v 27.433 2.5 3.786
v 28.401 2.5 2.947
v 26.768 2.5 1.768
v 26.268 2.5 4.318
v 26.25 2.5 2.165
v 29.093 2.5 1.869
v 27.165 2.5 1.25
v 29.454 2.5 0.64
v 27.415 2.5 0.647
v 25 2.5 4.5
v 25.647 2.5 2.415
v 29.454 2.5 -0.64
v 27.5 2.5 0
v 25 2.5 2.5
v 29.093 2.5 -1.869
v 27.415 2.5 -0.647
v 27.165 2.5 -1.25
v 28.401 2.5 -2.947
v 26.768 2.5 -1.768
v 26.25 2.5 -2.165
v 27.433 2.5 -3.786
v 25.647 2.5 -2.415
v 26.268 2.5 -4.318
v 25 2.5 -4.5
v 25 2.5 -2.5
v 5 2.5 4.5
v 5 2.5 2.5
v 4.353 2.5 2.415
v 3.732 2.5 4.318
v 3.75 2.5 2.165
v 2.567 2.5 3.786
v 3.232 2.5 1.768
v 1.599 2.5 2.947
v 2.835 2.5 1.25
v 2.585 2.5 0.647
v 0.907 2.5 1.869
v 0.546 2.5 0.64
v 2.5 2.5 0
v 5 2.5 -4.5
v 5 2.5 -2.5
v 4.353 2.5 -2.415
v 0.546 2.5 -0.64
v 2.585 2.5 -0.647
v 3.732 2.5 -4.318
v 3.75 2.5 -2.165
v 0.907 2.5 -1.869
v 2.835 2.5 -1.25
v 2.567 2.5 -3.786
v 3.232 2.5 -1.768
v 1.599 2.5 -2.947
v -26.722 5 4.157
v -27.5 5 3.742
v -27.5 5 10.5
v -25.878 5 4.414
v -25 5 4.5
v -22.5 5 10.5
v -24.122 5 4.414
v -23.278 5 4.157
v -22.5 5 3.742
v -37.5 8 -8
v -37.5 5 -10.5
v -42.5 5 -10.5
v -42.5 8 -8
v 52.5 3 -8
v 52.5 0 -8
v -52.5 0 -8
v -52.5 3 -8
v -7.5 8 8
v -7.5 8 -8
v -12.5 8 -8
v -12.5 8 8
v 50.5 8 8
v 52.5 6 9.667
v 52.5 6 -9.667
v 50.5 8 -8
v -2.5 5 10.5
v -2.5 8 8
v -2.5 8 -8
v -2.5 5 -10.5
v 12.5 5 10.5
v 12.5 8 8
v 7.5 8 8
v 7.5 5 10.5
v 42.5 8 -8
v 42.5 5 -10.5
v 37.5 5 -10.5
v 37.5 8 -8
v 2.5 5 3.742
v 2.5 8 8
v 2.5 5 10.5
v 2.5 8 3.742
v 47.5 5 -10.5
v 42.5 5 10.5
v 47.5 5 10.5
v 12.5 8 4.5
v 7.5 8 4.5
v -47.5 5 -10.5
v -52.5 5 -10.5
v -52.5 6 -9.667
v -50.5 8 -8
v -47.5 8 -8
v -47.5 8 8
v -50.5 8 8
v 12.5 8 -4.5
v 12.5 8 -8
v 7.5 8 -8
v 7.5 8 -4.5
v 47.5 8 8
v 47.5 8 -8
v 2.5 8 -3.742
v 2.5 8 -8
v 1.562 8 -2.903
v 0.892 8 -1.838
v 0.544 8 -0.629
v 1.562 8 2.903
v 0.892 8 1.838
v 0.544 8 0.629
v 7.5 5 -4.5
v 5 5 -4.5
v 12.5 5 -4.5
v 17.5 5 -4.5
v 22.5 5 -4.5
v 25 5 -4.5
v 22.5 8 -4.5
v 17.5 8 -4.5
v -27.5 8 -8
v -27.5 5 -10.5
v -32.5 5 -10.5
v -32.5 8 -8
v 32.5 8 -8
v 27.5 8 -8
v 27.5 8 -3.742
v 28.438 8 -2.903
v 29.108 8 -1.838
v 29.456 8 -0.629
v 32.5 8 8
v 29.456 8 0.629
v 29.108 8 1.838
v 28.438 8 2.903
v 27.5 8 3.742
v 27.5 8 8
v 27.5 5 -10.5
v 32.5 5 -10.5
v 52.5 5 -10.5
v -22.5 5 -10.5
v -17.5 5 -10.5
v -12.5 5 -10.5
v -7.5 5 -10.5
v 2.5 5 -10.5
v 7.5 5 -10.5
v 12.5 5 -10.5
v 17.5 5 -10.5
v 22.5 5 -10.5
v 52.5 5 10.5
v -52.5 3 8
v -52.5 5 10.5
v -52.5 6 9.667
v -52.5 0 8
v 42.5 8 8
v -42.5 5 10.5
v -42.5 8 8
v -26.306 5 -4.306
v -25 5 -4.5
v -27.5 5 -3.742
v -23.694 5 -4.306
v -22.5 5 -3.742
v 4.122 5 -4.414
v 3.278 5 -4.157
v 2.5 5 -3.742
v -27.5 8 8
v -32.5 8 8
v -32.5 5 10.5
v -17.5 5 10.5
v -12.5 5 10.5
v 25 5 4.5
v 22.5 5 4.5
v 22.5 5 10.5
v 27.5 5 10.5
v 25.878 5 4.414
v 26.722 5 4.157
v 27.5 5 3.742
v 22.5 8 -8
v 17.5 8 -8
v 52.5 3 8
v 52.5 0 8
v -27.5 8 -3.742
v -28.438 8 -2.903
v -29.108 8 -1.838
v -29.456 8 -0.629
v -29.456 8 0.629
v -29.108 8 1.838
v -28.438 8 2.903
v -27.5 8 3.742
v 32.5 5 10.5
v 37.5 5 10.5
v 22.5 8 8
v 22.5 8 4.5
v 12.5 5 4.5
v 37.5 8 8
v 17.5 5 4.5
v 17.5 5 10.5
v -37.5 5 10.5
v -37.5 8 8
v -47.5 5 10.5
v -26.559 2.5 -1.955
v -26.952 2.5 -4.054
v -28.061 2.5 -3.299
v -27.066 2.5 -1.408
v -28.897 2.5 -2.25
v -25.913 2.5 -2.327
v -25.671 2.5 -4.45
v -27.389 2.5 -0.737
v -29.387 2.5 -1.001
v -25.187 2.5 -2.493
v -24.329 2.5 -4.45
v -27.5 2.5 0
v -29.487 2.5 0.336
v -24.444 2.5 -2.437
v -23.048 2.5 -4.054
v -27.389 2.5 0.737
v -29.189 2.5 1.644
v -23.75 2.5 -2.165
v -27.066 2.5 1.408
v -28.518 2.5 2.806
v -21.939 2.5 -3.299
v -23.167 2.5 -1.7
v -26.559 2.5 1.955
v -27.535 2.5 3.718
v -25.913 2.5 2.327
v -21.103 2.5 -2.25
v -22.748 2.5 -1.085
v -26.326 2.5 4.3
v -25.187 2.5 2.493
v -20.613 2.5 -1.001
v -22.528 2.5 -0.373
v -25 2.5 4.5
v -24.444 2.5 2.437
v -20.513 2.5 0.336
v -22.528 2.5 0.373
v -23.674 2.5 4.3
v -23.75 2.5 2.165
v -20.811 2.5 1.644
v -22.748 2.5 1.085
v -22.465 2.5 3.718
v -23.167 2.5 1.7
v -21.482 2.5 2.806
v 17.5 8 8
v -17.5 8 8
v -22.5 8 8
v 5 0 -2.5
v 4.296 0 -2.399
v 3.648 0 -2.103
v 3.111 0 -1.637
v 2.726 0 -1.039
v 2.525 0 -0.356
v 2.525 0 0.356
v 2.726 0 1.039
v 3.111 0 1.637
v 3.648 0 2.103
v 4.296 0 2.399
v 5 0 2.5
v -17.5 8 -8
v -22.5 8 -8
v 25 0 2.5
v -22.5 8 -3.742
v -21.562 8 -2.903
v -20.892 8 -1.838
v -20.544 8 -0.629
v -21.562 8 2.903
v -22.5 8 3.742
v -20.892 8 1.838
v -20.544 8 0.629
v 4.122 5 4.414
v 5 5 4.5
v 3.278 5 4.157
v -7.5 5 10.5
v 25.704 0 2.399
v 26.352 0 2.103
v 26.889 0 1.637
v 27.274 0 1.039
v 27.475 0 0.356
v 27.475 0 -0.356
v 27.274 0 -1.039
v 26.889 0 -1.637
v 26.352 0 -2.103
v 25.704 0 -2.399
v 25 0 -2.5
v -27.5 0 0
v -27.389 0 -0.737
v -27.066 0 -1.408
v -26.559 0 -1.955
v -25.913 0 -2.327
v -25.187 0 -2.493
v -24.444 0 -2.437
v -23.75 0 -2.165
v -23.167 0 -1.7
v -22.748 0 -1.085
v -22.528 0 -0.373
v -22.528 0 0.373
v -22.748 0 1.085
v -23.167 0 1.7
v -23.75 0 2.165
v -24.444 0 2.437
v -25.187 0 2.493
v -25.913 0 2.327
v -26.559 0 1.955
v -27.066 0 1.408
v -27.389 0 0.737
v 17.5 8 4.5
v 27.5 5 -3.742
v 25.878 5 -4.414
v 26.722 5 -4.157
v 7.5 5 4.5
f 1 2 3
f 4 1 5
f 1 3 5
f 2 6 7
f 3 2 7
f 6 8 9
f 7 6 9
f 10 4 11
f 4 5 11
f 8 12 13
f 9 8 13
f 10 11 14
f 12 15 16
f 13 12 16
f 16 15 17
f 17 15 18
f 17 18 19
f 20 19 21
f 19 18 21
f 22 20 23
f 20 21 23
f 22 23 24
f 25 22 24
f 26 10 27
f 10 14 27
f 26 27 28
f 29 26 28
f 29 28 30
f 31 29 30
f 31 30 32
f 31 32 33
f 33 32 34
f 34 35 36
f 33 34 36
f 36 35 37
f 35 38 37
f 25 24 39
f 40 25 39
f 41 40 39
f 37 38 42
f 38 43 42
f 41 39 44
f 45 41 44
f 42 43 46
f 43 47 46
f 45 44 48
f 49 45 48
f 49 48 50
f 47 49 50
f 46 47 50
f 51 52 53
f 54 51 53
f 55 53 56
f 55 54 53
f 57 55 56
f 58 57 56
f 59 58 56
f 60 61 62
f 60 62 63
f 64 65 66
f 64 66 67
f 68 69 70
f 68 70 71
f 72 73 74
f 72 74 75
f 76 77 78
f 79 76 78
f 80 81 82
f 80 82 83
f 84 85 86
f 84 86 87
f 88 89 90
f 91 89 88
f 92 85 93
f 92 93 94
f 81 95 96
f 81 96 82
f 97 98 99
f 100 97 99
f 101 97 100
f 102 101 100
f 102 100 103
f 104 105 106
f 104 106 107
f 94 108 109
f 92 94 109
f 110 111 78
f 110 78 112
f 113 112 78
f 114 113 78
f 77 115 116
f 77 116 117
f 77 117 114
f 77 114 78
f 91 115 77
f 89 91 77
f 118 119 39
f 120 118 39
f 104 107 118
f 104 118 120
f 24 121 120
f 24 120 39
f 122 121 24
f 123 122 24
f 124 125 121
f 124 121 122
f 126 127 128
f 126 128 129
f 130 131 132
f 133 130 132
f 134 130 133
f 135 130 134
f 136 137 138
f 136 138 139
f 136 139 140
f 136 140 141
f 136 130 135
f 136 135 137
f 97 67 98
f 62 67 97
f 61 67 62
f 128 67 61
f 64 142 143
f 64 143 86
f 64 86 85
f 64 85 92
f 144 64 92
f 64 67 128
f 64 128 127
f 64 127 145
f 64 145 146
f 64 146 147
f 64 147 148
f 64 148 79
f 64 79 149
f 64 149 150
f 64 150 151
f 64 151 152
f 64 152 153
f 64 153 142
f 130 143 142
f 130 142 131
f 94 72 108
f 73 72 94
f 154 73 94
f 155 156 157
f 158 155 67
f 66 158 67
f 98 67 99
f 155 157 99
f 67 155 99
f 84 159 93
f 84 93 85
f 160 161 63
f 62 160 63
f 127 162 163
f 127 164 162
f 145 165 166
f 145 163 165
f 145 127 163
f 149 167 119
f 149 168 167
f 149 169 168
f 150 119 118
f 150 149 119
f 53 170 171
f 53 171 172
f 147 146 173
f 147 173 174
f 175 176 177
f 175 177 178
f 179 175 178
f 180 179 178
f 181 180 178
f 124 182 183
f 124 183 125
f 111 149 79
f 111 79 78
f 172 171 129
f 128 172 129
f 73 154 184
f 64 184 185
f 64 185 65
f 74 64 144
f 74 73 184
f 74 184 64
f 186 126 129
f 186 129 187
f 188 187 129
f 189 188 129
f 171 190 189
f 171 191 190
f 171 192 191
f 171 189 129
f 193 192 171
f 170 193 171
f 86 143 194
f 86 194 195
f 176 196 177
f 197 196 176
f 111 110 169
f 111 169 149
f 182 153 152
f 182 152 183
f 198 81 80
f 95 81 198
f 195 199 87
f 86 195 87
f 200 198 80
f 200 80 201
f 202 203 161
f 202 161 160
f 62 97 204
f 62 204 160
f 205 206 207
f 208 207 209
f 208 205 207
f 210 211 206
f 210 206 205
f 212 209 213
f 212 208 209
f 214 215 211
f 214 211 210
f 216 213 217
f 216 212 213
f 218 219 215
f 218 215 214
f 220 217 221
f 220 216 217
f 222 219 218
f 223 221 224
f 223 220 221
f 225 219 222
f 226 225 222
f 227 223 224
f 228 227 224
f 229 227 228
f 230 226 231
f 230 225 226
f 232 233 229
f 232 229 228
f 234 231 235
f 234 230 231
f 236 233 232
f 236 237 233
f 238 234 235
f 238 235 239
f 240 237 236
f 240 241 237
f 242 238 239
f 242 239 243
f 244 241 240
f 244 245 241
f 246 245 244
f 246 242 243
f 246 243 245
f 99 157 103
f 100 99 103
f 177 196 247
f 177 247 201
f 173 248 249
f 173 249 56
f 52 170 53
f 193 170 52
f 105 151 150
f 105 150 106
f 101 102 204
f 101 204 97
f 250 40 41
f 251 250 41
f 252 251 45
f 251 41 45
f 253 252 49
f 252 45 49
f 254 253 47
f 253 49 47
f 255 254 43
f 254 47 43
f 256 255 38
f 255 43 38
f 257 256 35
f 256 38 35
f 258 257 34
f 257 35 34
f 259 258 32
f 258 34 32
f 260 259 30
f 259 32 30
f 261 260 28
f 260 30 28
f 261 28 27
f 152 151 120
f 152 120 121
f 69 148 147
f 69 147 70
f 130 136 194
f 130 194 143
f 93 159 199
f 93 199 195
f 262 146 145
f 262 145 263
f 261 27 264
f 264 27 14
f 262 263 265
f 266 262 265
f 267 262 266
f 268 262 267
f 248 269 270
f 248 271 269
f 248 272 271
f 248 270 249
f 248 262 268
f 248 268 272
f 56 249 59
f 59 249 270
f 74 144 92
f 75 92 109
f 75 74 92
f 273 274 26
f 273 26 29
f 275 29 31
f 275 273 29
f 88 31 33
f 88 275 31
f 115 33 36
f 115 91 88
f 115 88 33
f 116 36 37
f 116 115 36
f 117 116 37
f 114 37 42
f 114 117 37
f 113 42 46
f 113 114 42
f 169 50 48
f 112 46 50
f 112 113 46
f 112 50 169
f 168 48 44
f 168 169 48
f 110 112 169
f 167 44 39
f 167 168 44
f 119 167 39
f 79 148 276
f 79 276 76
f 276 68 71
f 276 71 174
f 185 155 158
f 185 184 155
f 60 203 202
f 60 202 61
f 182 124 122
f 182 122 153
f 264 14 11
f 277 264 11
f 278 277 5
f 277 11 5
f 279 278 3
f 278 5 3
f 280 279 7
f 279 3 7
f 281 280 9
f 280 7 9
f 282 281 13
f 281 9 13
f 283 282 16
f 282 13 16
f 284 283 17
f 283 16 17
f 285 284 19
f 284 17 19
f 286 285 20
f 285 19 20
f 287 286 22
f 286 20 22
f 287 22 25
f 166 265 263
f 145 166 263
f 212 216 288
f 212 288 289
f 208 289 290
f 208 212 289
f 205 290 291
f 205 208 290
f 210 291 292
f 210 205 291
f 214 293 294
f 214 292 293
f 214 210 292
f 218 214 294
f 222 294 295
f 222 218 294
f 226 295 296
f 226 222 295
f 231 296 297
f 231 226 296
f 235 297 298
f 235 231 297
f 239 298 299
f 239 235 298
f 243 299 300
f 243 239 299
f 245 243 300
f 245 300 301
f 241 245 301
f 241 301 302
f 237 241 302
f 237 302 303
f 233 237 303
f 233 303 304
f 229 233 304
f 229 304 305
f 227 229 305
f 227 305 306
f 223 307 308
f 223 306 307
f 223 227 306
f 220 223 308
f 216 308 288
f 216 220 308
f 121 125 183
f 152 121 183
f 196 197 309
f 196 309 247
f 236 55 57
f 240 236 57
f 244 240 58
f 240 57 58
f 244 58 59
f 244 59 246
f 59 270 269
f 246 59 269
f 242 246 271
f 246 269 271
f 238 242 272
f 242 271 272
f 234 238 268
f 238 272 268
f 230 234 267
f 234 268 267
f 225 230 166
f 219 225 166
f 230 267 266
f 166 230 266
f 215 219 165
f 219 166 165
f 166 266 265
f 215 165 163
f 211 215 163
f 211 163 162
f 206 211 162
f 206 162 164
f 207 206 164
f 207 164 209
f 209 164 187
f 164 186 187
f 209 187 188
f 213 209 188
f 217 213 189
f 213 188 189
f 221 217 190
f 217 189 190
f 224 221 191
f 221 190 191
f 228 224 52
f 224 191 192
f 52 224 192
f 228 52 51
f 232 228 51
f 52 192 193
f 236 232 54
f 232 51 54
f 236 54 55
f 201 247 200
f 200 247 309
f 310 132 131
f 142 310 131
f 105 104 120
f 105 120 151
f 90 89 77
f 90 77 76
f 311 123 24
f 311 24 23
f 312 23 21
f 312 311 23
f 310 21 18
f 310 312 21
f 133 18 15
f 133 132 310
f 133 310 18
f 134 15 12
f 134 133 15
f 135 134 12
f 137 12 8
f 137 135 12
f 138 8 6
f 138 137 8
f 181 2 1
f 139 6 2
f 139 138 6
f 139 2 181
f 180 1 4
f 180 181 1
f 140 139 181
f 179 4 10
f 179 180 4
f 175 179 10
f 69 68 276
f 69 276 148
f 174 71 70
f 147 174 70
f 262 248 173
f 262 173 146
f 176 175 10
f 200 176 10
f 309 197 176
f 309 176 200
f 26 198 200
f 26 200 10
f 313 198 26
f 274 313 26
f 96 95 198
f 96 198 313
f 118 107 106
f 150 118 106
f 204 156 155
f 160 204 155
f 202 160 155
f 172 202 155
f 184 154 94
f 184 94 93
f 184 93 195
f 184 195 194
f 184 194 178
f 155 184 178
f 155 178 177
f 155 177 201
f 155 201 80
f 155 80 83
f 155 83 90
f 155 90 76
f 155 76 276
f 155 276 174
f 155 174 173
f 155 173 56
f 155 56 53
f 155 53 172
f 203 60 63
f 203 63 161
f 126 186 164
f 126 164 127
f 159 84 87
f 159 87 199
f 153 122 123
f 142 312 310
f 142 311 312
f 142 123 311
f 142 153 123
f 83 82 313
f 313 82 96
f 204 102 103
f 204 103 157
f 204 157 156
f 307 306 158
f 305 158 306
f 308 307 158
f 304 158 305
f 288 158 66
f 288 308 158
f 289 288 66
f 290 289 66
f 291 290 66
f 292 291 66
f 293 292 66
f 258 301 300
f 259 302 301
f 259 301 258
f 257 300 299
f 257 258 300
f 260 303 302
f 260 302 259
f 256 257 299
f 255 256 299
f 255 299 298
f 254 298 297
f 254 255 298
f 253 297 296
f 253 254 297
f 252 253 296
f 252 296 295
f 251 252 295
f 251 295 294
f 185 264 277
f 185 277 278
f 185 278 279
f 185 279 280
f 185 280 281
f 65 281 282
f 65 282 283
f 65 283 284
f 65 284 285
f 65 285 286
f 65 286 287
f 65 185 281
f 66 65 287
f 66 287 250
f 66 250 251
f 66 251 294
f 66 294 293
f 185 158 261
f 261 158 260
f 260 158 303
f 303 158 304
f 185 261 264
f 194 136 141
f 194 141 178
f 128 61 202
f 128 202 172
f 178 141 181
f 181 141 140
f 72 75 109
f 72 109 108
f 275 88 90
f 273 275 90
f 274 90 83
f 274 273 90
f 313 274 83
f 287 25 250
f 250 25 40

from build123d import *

# Parameters (mm, degrees)
EXTRUDE_1_DEPTH          = 52.5
SKETCH_2_W               = 5
SKETCH_2_H               = 21
CUT_EXTRUDE_1_DEPTH      = 3
CUT_EXTRUDE_2_DEPTH      = 55.13409277
CUT_EXTRUDE_2_DEPTH_BACK = 55.13409277
SKETCH_3_R               = 2.5
CUT_EXTRUDE_3_DEPTH      = 55.13409277
SKETCH_5_R               = 4.5
CUT_EXTRUDE_4_DEPTH      = 5.5


with BuildPart() as part:
    # 草图1 → 凸台-拉伸1 (new, symmetric)
    with BuildSketch(Plane(origin=(0, 0, 0), x_dir=(0, 0, -1), z_dir=(1, 0, 0))):
        Polygon((-8, 0), (8, 0), (8, 3), (10.5, 5), (8, 8), (-8, 8), (-10.5, 5), (-8, 3), align=None)
    extrude(amount=EXTRUDE_1_DEPTH, both=True)

    # 草图2 → 切除-拉伸1 (cut)
    with BuildSketch(Plane(origin=(0, 8, 0), x_dir=(1, 0, 0), z_dir=(0, 1, 0))):
        with Locations((-5, 0)):
            Rectangle(SKETCH_2_W, SKETCH_2_H)
        with Locations((45, 0)):
            Rectangle(SKETCH_2_W, SKETCH_2_H)
        with Locations((-15, 0)):
            Rectangle(SKETCH_2_W, SKETCH_2_H)
        with Locations((-25, 0)):
            Rectangle(SKETCH_2_W, SKETCH_2_H)
        with Locations((-35, 0)):
            Rectangle(SKETCH_2_W, SKETCH_2_H)
        with Locations((-45, 0)):
            Rectangle(SKETCH_2_W, SKETCH_2_H)
        with Locations((35, 0)):
            Rectangle(SKETCH_2_W, SKETCH_2_H)
        with Locations((25, 0)):
            Rectangle(SKETCH_2_W, SKETCH_2_H)
        with Locations((15, 0)):
            Rectangle(SKETCH_2_W, SKETCH_2_H)
        with Locations((5, 0)):
            Rectangle(SKETCH_2_W, SKETCH_2_H)
    extrude(amount=-CUT_EXTRUDE_1_DEPTH, mode=Mode.SUBTRACT)

    # 草图3 → 切除-拉伸2 (cut, two sides: drawn at the far end of the back side and taken through both)
    with BuildSketch(Plane.XZ.offset(-CUT_EXTRUDE_2_DEPTH_BACK)):
        with Locations(Location((-25, 0, 0), (0, 0, 180))):
            Circle(SKETCH_3_R)
        with BuildLine():
            Line((5, 2.5), (25, 2.5))
            ThreePointArc((25, 2.5), (27.5, 0), (25, -2.5))
            Line((25, -2.5), (5, -2.5))
            ThreePointArc((5, -2.5), (2.5, 0), (5, 2.5))
        make_face()
    extrude(amount=CUT_EXTRUDE_2_DEPTH + CUT_EXTRUDE_2_DEPTH_BACK, mode=Mode.SUBTRACT)

    # 草图4 → 切除-拉伸3 (cut, symmetric)
    with BuildSketch(Plane.XY):
        Polygon((-52.5, 6), (-50.5, 8), (-52.5, 8), align=None)
    cut_extrude_3 = extrude(amount=CUT_EXTRUDE_3_DEPTH, both=True, mode=Mode.SUBTRACT)

    # 镜向1: 切除-拉伸3 across plane
    add(cut_extrude_3.mirror(Plane(origin=(0, 0, 0), x_dir=(0, 0, 1), z_dir=(1, 0, 0))), mode=Mode.SUBTRACT)

    # 草图5 → 切除-拉伸4 (cut)
    # profile 1 of 2: a face of its own
    with BuildSketch(Plane(origin=(0, 8, 0), x_dir=(1, 0, 0), z_dir=(0, 1, 0))):
        with Locations(Location((-25, 0, 0), (0, 0, 270))):
            Circle(SKETCH_5_R)
    # profile 2 of 2: a face of its own
    with BuildSketch(Plane(origin=(0, 8, 0), x_dir=(1, 0, 0), z_dir=(0, 1, 0))):
        with BuildLine():
            Line((5, 4.5), (25, 4.5))
            ThreePointArc((25, 4.5), (29.5, 0), (25, -4.5))
            Line((25, -4.5), (5, -4.5))
            ThreePointArc((5, -4.5), (0.5, 0), (5, 4.5))
        make_face()
        with BuildLine():
            Line((7.5, -2.5), (5, -2.5))
            ThreePointArc((5, -2.5), (3.232233047, -1.767766953), (2.5, 0))
            ThreePointArc((2.5, 0), (3.232233047, 1.767766953), (5, 2.5))
            Line((5, 2.5), (7.5, 2.5))
            Line((7.5, 2.5), (12.5, 2.5))
            Line((12.5, 2.5), (17.5, 2.5))
            Line((17.5, 2.5), (22.5, 2.5))
            Line((22.5, 2.5), (25, 2.5))
            ThreePointArc((25, 2.5), (26.767766953, 1.767766953), (27.5, 0))
            ThreePointArc((27.5, 0), (26.767766953, -1.767766953), (25, -2.5))
            Line((25, -2.5), (22.5, -2.5))
            Line((22.5, -2.5), (17.5, -2.5))
            Line((17.5, -2.5), (12.5, -2.5))
            Line((12.5, -2.5), (7.5, -2.5))
        make_face(mode=Mode.SUBTRACT)
    extrude(amount=-CUT_EXTRUDE_4_DEPTH, mode=Mode.SUBTRACT)


solid = part.part
